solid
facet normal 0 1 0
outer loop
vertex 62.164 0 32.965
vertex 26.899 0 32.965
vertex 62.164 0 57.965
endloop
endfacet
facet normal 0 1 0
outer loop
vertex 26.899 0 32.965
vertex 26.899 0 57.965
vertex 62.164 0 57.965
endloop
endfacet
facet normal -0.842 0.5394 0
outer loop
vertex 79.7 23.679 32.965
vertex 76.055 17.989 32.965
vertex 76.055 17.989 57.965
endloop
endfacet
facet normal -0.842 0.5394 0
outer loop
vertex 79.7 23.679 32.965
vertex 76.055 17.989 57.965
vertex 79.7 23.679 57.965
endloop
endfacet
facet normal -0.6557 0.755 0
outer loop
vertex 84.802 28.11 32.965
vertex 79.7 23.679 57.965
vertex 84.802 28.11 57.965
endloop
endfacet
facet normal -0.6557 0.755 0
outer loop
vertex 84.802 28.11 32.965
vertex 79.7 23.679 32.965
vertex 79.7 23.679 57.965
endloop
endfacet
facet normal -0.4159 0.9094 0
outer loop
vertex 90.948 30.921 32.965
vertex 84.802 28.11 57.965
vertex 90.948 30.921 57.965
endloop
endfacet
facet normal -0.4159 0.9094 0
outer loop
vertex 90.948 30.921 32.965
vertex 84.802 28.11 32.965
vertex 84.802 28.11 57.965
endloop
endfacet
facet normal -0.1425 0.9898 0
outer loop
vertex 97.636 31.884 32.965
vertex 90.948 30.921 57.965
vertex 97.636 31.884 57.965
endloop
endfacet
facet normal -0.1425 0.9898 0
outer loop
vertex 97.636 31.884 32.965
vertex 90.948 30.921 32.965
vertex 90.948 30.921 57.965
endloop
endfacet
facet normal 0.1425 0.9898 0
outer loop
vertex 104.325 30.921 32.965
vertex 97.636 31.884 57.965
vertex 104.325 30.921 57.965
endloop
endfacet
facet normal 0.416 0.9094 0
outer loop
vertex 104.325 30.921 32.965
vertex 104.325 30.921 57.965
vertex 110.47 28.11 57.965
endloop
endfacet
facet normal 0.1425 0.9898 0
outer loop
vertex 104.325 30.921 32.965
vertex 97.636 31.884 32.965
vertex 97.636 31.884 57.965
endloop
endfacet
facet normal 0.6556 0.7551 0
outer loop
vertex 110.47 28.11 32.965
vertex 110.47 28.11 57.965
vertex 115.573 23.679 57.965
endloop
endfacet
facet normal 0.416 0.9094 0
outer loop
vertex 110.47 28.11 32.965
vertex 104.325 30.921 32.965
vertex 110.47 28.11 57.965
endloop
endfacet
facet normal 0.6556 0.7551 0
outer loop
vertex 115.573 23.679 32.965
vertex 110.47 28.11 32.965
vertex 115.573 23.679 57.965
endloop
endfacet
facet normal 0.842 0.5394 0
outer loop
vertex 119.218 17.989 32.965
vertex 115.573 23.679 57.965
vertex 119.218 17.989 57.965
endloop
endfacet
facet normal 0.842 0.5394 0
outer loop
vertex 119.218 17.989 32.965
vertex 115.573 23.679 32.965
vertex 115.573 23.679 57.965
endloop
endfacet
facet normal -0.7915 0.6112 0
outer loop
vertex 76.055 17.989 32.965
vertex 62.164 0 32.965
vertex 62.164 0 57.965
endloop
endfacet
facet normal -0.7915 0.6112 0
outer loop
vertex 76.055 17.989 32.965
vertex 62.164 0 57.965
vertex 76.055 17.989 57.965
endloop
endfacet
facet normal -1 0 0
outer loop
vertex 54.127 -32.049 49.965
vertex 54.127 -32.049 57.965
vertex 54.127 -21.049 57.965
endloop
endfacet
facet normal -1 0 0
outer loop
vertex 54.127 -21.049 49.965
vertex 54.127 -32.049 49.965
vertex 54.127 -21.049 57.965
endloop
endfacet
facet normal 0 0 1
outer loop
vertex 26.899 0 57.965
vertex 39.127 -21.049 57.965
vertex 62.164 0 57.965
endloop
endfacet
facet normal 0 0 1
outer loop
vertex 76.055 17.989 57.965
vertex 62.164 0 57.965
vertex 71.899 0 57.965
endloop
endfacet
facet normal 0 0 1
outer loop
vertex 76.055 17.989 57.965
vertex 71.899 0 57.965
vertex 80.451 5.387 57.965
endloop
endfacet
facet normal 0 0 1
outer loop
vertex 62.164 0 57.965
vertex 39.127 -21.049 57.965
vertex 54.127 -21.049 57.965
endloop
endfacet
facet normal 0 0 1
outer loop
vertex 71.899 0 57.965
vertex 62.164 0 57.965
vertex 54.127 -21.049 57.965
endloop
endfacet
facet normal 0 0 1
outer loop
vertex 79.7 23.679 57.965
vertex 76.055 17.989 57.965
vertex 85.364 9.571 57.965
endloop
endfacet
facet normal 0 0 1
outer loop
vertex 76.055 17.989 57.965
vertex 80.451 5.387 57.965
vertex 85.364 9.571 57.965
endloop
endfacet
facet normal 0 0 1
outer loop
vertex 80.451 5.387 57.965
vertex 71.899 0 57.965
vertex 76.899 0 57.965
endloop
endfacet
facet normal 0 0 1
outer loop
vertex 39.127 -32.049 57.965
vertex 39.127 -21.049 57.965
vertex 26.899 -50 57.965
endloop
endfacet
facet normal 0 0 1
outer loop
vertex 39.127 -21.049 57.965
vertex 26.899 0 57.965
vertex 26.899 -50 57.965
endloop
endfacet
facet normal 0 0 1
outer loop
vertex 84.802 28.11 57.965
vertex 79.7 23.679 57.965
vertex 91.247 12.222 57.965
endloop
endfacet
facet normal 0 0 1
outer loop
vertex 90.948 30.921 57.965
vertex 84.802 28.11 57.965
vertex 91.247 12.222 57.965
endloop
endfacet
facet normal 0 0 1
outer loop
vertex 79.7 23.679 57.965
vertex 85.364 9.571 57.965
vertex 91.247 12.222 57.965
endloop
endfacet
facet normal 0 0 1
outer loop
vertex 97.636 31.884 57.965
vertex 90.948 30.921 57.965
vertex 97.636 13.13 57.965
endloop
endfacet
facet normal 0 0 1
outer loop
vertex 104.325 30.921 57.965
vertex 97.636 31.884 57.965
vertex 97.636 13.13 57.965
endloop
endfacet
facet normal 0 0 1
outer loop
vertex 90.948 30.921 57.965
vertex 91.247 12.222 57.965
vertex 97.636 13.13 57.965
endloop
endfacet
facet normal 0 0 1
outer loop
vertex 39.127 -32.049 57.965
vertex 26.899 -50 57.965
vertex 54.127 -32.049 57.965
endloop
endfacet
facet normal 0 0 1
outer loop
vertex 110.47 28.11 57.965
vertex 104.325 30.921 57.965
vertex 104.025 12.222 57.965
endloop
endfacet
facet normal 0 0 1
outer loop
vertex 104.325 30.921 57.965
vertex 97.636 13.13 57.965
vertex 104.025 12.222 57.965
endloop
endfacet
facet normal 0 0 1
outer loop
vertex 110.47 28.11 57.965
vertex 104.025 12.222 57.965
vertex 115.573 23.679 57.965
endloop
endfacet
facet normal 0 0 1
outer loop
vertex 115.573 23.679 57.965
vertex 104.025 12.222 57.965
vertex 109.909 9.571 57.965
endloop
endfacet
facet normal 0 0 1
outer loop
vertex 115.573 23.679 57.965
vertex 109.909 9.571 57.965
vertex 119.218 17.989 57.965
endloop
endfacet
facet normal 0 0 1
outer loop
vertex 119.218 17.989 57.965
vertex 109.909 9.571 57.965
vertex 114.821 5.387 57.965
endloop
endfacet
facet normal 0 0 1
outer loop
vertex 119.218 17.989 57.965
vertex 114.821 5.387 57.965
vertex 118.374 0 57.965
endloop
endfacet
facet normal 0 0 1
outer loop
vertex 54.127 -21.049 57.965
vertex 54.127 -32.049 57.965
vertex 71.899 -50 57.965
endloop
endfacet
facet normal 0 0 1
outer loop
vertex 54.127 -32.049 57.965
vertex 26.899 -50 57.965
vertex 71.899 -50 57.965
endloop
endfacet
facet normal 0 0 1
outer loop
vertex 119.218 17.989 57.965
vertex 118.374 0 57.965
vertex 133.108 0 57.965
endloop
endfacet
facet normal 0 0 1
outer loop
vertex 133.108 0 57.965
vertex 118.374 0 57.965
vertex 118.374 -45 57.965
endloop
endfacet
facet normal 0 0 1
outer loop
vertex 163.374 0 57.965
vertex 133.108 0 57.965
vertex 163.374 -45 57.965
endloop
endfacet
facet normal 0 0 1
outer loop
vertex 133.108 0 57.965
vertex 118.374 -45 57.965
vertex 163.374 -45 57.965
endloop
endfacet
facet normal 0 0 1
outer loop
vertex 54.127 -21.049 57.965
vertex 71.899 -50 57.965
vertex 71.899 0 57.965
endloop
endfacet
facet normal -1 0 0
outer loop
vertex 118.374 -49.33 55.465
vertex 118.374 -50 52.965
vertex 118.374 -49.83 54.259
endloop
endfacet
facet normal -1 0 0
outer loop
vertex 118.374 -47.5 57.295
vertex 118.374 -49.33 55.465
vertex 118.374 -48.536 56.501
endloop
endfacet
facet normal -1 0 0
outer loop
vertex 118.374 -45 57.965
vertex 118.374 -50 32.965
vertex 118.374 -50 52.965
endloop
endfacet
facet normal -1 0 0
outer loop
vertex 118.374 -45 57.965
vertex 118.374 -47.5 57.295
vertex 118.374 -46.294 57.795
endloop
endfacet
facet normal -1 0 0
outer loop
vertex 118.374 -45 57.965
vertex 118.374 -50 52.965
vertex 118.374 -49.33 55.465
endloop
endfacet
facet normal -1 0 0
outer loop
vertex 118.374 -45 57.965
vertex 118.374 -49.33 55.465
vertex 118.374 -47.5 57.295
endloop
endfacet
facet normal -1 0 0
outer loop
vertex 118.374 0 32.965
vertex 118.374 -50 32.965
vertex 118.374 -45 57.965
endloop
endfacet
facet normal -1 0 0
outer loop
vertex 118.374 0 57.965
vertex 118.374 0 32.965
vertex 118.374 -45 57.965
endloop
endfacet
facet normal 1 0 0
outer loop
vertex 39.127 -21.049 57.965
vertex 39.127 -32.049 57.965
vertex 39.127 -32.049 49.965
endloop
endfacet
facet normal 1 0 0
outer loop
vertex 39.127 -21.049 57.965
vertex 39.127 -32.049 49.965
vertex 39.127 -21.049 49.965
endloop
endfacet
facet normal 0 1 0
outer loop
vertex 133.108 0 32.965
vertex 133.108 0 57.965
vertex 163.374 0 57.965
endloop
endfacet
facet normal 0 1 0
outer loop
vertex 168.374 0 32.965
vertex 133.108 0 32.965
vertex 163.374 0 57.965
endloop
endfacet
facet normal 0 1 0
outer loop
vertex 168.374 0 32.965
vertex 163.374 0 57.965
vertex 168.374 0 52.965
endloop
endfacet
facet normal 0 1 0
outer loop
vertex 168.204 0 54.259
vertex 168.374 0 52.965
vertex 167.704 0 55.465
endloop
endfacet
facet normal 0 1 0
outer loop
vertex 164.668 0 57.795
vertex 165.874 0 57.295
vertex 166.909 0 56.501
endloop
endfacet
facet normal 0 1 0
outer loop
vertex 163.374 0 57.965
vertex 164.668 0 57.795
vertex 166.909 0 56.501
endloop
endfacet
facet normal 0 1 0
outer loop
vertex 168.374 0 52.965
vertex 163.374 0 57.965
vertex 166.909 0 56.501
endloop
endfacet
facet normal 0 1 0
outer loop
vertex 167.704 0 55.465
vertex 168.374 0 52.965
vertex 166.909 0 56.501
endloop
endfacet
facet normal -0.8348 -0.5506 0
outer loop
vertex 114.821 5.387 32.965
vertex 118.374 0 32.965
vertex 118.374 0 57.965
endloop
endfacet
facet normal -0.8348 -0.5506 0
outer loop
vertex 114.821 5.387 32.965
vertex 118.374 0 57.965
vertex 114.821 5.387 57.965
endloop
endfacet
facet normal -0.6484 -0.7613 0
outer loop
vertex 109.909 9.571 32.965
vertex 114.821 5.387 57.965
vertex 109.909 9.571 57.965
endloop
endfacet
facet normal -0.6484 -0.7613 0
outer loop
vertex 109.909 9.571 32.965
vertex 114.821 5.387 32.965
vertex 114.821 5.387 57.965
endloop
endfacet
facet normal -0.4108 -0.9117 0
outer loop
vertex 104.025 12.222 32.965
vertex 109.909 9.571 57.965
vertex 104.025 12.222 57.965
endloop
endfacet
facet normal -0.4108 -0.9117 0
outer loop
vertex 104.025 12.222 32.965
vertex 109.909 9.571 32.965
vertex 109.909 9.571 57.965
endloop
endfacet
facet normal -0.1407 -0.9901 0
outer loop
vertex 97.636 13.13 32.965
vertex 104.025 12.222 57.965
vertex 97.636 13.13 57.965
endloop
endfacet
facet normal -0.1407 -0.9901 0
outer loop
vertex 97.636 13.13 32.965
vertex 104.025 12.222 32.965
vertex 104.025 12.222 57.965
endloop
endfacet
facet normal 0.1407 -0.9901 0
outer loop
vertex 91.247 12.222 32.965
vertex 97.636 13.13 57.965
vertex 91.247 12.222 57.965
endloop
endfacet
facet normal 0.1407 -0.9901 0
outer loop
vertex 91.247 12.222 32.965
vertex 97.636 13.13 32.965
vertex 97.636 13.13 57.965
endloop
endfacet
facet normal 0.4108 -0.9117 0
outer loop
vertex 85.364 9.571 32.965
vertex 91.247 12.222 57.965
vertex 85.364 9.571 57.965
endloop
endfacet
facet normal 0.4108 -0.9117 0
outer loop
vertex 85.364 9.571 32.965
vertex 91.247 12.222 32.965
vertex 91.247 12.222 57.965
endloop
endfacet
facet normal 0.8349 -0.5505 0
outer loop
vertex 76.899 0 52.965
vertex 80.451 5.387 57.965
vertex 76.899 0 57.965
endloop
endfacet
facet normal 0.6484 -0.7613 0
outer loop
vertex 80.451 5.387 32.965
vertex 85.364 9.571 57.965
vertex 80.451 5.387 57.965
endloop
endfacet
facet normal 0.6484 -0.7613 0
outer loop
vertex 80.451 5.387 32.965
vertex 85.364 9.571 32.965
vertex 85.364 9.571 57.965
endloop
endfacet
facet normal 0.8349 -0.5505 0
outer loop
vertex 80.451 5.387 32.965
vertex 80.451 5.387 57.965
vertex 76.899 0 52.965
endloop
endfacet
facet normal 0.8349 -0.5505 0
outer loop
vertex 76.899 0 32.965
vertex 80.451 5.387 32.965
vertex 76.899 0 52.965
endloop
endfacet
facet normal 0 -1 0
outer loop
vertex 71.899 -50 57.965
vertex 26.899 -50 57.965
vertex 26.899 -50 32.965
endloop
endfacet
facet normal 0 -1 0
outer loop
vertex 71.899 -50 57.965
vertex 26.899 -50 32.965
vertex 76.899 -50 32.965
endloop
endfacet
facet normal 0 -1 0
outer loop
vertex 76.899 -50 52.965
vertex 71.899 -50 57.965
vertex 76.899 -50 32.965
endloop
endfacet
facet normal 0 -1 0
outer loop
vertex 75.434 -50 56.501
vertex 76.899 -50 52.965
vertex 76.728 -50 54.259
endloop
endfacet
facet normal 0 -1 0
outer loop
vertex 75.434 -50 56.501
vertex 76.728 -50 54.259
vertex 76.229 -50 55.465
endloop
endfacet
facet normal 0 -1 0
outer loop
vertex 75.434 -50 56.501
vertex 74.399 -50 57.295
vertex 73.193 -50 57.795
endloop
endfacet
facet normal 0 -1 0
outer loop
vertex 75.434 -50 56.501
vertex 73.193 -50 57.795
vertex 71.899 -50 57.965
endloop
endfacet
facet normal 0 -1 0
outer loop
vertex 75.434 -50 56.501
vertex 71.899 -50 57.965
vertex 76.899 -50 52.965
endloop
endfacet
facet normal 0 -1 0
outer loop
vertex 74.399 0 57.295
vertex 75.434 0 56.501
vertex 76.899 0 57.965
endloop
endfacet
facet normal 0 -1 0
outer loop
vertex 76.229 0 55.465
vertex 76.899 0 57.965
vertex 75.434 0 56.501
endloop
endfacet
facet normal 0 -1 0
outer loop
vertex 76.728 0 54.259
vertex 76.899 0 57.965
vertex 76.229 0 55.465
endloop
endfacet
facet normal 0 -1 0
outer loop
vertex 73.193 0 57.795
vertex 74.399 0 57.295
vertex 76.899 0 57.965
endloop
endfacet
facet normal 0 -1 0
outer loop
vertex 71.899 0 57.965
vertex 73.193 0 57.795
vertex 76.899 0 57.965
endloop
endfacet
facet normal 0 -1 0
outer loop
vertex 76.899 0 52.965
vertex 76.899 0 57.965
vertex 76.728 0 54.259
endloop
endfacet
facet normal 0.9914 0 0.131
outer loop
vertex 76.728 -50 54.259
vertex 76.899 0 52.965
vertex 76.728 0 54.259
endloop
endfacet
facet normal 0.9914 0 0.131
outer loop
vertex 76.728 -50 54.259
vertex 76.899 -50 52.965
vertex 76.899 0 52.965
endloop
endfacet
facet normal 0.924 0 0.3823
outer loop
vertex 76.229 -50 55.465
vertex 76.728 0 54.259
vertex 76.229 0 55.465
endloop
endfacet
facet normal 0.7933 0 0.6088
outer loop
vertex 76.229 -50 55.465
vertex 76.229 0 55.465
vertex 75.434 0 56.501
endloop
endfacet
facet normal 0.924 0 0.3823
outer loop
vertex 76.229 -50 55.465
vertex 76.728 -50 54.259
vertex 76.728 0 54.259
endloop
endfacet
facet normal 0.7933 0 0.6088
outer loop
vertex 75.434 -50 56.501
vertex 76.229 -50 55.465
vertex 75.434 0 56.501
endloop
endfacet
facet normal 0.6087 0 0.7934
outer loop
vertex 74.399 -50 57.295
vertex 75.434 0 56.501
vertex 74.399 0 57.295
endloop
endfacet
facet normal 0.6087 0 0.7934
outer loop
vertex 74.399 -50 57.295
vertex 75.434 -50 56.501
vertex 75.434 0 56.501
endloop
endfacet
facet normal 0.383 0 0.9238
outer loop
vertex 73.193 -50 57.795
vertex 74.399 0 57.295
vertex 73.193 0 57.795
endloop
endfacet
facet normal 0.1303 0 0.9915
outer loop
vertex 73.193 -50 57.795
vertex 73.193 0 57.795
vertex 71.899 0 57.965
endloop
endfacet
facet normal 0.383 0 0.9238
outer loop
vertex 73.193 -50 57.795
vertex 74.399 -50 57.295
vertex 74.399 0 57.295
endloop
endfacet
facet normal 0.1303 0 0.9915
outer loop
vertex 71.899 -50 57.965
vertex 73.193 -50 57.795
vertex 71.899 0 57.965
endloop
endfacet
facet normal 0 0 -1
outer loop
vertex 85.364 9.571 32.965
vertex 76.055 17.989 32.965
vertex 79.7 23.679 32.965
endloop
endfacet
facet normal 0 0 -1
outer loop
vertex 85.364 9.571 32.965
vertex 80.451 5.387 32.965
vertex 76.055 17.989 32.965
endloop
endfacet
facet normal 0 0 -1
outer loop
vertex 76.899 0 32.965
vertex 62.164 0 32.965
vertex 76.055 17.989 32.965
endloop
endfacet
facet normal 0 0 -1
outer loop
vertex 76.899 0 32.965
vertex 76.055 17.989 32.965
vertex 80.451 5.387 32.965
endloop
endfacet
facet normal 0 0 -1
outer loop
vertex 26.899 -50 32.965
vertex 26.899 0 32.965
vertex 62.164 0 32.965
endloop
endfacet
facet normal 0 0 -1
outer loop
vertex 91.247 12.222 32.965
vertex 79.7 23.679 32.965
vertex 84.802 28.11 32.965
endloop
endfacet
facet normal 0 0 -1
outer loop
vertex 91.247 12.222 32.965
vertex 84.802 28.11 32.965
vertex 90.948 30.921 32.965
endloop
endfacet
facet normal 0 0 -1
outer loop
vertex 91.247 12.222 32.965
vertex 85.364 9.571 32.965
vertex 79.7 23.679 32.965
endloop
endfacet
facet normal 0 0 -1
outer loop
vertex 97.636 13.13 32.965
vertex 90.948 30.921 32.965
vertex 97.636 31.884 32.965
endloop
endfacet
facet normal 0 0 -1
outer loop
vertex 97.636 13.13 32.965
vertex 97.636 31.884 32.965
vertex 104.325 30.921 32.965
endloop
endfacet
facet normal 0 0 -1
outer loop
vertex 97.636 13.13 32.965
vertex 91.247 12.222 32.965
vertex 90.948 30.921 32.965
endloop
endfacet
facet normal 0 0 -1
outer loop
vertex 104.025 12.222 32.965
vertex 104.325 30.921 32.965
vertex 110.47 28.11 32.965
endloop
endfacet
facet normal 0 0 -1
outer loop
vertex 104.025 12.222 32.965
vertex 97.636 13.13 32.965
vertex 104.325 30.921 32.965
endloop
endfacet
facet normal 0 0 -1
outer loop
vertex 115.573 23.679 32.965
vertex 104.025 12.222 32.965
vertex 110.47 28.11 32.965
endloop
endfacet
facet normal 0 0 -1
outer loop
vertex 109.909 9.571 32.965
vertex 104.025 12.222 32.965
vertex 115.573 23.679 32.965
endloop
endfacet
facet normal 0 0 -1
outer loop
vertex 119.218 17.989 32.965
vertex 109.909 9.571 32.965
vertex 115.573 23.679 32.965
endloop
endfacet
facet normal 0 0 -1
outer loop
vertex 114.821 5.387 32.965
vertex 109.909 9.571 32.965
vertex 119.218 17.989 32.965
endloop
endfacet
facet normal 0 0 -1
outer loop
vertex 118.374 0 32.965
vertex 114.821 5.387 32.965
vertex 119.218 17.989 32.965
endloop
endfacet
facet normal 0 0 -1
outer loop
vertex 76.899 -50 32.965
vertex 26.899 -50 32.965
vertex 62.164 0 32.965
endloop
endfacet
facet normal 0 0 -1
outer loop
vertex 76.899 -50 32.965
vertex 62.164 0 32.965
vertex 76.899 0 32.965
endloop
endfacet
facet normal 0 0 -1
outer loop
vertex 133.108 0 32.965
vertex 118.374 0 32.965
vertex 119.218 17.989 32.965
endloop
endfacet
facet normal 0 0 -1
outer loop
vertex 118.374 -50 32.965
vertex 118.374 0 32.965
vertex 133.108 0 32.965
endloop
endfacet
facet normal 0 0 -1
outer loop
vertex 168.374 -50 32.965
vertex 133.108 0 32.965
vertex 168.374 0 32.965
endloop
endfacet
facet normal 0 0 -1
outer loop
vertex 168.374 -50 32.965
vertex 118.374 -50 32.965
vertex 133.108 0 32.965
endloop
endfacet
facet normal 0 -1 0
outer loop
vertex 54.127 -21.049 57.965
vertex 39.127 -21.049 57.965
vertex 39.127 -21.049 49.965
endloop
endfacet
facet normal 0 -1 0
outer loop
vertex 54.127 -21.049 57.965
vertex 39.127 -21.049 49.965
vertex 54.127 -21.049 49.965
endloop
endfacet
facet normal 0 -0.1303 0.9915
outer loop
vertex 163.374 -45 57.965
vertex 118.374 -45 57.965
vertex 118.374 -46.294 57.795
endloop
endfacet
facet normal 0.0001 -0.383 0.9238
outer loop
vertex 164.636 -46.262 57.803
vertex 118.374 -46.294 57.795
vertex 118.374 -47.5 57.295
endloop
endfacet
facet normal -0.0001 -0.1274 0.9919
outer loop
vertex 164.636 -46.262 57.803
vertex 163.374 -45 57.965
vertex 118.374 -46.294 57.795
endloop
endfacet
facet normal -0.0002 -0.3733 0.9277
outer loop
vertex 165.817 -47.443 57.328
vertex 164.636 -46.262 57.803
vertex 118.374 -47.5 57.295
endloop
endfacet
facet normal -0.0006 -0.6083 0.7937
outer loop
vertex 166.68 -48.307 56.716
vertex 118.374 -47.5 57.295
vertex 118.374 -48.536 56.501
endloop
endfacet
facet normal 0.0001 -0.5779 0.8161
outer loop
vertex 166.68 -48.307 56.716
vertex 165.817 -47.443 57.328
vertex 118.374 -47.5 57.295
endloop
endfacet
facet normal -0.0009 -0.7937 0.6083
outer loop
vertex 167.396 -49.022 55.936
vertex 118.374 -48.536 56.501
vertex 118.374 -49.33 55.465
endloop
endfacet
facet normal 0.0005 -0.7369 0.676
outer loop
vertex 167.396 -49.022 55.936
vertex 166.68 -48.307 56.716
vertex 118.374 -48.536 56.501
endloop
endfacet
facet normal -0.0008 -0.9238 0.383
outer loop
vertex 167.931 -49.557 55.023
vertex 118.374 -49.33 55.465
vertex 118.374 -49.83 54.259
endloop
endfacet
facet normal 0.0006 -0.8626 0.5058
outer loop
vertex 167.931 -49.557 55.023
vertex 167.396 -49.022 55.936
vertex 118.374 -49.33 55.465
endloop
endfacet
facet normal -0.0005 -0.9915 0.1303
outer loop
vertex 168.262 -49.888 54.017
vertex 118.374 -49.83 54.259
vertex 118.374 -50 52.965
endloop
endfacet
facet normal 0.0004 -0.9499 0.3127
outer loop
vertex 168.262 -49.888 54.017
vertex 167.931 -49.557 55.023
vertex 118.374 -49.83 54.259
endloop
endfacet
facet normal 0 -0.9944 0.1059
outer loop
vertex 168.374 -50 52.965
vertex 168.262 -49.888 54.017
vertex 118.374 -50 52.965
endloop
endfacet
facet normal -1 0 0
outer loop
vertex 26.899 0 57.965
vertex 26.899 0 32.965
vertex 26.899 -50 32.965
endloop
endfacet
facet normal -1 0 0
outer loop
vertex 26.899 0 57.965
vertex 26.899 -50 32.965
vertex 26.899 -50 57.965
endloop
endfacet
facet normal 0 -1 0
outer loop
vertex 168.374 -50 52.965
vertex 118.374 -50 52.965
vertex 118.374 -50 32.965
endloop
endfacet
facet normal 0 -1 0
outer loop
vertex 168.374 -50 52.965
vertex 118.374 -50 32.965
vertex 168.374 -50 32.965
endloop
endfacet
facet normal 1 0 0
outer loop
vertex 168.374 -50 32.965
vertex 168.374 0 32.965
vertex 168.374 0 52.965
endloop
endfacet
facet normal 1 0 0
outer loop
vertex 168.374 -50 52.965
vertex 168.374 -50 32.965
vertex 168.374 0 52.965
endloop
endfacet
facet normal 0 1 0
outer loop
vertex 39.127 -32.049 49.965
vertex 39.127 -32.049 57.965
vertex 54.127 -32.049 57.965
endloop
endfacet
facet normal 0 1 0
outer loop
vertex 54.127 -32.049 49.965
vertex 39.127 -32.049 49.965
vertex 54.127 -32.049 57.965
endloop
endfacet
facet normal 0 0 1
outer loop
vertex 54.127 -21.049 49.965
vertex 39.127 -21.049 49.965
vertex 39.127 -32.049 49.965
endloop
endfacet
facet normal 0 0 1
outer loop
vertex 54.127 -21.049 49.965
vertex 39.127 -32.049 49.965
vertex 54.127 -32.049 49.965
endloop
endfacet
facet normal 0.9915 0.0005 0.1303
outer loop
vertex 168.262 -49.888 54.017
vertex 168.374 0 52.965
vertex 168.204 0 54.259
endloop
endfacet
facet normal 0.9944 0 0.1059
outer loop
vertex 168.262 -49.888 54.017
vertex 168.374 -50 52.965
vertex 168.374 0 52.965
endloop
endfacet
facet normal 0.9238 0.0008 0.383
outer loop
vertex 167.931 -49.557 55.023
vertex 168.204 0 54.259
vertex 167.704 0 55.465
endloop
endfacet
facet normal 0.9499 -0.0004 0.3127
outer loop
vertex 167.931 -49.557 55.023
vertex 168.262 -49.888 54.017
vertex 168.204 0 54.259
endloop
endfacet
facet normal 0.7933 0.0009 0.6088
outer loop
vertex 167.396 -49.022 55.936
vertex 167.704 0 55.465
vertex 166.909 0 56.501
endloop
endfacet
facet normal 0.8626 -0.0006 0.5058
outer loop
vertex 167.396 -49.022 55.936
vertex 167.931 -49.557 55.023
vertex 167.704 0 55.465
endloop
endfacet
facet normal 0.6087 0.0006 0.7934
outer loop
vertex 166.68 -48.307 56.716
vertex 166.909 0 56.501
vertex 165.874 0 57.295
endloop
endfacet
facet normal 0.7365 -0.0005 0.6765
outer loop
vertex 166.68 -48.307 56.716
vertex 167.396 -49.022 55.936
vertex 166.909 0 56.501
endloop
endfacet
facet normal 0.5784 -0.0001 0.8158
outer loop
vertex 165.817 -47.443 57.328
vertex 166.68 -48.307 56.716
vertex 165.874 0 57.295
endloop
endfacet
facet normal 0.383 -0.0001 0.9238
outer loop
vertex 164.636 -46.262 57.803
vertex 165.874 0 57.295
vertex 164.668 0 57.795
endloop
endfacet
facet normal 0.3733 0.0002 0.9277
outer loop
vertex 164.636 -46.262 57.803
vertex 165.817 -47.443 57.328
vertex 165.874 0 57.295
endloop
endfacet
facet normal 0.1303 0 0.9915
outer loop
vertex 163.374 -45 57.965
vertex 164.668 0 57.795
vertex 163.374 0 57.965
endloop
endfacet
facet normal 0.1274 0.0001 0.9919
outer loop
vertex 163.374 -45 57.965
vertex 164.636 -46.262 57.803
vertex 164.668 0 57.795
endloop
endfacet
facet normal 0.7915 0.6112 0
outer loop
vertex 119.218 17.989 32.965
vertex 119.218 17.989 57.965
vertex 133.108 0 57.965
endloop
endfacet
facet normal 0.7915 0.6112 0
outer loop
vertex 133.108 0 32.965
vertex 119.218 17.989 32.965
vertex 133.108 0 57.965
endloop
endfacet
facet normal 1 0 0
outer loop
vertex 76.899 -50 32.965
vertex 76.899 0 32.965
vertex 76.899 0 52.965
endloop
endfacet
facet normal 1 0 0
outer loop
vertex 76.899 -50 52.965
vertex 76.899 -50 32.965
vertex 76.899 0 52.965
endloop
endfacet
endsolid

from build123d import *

# Parameters (mm, degrees)
F0_W     = 50
F0_H     = 25
F1_DEPTH = 50
F2_R     = 5
F2_2_R   = 5
F3_W     = 15
F3_H     = 11
F3_R     = 5
F4_DEPTH = 8
F7_DEPTH = 25


with BuildPart() as f1:
    # F0 (on Front) → F1 (new body)
    with BuildSketch(Plane.XZ):
        with Locations((51.8986206502, 45.4651199281)):
            Rectangle(F0_W, F0_H)
    extrude(amount=F1_DEPTH)

    # F2
    f2_edges = [f1.edges().sort_by_distance(p)[0] for p in [
        (76.898621, -25, 57.96512),
    ]]
    fillet(f2_edges, radius=F2_R)

    # F3 (on face) → F4 (cut)
    with BuildSketch(Plane.XY.offset(57.9651199281)):
        with Locations((46.6270151734, -26.549421221)):
            Rectangle(F3_W, F3_H)
        with Locations((140.8739293367, -25.6193820387)):
            Circle(F3_R)
    extrude(amount=-F4_DEPTH, mode=Mode.SUBTRACT)



with BuildPart() as f1b:
    # F0 (on Front) → F1, piece 2 (new body)
    with BuildSketch(Plane.XZ):
        with Locations((143.3739293367, 45.4651199281)):
            Rectangle(F0_W, F0_H)
    extrude(amount=F1_DEPTH)

    # F2#2
    f2_2_edges = [f1b.edges().sort_by_distance(p)[0] for p in [
        (168.373929, -25, 57.96512),
        (143.373929, -50, 57.96512),
    ]]
    fillet(f2_2_edges, radius=F2_2_R)


with BuildPart() as f1_1:
    add(f1.part)

    add(f1b.part)  # F7 merges F1b
    # F6 (on offset) → F7 (join)
    with BuildSketch(Plane(origin=(0, 0, 32.9651199281), x_dir=(1, 0, 0), z_dir=(0, 0, -1))):
        with BuildLine():
            ThreePointArc((118.3739293367, 0), (97.6362749934, -13.1297755552), (76.8986206502, 0))
            Line((76.8986206502, 0), (62.1641688049, 0))
            Line((62.1641688049, 0), (76.054610312, -17.9887413979))
            ThreePointArc((76.054610312, -17.9887413979), (97.6362749934, -31.8841869417), (119.2179396749, -17.9887413979))
            Line((119.2179396749, -17.9887413979), (133.108381182, 0))
            Line((133.108381182, 0), (118.3739293367, 0))
        make_face()
    extrude(amount=-F7_DEPTH)


solid = f1_1.part
